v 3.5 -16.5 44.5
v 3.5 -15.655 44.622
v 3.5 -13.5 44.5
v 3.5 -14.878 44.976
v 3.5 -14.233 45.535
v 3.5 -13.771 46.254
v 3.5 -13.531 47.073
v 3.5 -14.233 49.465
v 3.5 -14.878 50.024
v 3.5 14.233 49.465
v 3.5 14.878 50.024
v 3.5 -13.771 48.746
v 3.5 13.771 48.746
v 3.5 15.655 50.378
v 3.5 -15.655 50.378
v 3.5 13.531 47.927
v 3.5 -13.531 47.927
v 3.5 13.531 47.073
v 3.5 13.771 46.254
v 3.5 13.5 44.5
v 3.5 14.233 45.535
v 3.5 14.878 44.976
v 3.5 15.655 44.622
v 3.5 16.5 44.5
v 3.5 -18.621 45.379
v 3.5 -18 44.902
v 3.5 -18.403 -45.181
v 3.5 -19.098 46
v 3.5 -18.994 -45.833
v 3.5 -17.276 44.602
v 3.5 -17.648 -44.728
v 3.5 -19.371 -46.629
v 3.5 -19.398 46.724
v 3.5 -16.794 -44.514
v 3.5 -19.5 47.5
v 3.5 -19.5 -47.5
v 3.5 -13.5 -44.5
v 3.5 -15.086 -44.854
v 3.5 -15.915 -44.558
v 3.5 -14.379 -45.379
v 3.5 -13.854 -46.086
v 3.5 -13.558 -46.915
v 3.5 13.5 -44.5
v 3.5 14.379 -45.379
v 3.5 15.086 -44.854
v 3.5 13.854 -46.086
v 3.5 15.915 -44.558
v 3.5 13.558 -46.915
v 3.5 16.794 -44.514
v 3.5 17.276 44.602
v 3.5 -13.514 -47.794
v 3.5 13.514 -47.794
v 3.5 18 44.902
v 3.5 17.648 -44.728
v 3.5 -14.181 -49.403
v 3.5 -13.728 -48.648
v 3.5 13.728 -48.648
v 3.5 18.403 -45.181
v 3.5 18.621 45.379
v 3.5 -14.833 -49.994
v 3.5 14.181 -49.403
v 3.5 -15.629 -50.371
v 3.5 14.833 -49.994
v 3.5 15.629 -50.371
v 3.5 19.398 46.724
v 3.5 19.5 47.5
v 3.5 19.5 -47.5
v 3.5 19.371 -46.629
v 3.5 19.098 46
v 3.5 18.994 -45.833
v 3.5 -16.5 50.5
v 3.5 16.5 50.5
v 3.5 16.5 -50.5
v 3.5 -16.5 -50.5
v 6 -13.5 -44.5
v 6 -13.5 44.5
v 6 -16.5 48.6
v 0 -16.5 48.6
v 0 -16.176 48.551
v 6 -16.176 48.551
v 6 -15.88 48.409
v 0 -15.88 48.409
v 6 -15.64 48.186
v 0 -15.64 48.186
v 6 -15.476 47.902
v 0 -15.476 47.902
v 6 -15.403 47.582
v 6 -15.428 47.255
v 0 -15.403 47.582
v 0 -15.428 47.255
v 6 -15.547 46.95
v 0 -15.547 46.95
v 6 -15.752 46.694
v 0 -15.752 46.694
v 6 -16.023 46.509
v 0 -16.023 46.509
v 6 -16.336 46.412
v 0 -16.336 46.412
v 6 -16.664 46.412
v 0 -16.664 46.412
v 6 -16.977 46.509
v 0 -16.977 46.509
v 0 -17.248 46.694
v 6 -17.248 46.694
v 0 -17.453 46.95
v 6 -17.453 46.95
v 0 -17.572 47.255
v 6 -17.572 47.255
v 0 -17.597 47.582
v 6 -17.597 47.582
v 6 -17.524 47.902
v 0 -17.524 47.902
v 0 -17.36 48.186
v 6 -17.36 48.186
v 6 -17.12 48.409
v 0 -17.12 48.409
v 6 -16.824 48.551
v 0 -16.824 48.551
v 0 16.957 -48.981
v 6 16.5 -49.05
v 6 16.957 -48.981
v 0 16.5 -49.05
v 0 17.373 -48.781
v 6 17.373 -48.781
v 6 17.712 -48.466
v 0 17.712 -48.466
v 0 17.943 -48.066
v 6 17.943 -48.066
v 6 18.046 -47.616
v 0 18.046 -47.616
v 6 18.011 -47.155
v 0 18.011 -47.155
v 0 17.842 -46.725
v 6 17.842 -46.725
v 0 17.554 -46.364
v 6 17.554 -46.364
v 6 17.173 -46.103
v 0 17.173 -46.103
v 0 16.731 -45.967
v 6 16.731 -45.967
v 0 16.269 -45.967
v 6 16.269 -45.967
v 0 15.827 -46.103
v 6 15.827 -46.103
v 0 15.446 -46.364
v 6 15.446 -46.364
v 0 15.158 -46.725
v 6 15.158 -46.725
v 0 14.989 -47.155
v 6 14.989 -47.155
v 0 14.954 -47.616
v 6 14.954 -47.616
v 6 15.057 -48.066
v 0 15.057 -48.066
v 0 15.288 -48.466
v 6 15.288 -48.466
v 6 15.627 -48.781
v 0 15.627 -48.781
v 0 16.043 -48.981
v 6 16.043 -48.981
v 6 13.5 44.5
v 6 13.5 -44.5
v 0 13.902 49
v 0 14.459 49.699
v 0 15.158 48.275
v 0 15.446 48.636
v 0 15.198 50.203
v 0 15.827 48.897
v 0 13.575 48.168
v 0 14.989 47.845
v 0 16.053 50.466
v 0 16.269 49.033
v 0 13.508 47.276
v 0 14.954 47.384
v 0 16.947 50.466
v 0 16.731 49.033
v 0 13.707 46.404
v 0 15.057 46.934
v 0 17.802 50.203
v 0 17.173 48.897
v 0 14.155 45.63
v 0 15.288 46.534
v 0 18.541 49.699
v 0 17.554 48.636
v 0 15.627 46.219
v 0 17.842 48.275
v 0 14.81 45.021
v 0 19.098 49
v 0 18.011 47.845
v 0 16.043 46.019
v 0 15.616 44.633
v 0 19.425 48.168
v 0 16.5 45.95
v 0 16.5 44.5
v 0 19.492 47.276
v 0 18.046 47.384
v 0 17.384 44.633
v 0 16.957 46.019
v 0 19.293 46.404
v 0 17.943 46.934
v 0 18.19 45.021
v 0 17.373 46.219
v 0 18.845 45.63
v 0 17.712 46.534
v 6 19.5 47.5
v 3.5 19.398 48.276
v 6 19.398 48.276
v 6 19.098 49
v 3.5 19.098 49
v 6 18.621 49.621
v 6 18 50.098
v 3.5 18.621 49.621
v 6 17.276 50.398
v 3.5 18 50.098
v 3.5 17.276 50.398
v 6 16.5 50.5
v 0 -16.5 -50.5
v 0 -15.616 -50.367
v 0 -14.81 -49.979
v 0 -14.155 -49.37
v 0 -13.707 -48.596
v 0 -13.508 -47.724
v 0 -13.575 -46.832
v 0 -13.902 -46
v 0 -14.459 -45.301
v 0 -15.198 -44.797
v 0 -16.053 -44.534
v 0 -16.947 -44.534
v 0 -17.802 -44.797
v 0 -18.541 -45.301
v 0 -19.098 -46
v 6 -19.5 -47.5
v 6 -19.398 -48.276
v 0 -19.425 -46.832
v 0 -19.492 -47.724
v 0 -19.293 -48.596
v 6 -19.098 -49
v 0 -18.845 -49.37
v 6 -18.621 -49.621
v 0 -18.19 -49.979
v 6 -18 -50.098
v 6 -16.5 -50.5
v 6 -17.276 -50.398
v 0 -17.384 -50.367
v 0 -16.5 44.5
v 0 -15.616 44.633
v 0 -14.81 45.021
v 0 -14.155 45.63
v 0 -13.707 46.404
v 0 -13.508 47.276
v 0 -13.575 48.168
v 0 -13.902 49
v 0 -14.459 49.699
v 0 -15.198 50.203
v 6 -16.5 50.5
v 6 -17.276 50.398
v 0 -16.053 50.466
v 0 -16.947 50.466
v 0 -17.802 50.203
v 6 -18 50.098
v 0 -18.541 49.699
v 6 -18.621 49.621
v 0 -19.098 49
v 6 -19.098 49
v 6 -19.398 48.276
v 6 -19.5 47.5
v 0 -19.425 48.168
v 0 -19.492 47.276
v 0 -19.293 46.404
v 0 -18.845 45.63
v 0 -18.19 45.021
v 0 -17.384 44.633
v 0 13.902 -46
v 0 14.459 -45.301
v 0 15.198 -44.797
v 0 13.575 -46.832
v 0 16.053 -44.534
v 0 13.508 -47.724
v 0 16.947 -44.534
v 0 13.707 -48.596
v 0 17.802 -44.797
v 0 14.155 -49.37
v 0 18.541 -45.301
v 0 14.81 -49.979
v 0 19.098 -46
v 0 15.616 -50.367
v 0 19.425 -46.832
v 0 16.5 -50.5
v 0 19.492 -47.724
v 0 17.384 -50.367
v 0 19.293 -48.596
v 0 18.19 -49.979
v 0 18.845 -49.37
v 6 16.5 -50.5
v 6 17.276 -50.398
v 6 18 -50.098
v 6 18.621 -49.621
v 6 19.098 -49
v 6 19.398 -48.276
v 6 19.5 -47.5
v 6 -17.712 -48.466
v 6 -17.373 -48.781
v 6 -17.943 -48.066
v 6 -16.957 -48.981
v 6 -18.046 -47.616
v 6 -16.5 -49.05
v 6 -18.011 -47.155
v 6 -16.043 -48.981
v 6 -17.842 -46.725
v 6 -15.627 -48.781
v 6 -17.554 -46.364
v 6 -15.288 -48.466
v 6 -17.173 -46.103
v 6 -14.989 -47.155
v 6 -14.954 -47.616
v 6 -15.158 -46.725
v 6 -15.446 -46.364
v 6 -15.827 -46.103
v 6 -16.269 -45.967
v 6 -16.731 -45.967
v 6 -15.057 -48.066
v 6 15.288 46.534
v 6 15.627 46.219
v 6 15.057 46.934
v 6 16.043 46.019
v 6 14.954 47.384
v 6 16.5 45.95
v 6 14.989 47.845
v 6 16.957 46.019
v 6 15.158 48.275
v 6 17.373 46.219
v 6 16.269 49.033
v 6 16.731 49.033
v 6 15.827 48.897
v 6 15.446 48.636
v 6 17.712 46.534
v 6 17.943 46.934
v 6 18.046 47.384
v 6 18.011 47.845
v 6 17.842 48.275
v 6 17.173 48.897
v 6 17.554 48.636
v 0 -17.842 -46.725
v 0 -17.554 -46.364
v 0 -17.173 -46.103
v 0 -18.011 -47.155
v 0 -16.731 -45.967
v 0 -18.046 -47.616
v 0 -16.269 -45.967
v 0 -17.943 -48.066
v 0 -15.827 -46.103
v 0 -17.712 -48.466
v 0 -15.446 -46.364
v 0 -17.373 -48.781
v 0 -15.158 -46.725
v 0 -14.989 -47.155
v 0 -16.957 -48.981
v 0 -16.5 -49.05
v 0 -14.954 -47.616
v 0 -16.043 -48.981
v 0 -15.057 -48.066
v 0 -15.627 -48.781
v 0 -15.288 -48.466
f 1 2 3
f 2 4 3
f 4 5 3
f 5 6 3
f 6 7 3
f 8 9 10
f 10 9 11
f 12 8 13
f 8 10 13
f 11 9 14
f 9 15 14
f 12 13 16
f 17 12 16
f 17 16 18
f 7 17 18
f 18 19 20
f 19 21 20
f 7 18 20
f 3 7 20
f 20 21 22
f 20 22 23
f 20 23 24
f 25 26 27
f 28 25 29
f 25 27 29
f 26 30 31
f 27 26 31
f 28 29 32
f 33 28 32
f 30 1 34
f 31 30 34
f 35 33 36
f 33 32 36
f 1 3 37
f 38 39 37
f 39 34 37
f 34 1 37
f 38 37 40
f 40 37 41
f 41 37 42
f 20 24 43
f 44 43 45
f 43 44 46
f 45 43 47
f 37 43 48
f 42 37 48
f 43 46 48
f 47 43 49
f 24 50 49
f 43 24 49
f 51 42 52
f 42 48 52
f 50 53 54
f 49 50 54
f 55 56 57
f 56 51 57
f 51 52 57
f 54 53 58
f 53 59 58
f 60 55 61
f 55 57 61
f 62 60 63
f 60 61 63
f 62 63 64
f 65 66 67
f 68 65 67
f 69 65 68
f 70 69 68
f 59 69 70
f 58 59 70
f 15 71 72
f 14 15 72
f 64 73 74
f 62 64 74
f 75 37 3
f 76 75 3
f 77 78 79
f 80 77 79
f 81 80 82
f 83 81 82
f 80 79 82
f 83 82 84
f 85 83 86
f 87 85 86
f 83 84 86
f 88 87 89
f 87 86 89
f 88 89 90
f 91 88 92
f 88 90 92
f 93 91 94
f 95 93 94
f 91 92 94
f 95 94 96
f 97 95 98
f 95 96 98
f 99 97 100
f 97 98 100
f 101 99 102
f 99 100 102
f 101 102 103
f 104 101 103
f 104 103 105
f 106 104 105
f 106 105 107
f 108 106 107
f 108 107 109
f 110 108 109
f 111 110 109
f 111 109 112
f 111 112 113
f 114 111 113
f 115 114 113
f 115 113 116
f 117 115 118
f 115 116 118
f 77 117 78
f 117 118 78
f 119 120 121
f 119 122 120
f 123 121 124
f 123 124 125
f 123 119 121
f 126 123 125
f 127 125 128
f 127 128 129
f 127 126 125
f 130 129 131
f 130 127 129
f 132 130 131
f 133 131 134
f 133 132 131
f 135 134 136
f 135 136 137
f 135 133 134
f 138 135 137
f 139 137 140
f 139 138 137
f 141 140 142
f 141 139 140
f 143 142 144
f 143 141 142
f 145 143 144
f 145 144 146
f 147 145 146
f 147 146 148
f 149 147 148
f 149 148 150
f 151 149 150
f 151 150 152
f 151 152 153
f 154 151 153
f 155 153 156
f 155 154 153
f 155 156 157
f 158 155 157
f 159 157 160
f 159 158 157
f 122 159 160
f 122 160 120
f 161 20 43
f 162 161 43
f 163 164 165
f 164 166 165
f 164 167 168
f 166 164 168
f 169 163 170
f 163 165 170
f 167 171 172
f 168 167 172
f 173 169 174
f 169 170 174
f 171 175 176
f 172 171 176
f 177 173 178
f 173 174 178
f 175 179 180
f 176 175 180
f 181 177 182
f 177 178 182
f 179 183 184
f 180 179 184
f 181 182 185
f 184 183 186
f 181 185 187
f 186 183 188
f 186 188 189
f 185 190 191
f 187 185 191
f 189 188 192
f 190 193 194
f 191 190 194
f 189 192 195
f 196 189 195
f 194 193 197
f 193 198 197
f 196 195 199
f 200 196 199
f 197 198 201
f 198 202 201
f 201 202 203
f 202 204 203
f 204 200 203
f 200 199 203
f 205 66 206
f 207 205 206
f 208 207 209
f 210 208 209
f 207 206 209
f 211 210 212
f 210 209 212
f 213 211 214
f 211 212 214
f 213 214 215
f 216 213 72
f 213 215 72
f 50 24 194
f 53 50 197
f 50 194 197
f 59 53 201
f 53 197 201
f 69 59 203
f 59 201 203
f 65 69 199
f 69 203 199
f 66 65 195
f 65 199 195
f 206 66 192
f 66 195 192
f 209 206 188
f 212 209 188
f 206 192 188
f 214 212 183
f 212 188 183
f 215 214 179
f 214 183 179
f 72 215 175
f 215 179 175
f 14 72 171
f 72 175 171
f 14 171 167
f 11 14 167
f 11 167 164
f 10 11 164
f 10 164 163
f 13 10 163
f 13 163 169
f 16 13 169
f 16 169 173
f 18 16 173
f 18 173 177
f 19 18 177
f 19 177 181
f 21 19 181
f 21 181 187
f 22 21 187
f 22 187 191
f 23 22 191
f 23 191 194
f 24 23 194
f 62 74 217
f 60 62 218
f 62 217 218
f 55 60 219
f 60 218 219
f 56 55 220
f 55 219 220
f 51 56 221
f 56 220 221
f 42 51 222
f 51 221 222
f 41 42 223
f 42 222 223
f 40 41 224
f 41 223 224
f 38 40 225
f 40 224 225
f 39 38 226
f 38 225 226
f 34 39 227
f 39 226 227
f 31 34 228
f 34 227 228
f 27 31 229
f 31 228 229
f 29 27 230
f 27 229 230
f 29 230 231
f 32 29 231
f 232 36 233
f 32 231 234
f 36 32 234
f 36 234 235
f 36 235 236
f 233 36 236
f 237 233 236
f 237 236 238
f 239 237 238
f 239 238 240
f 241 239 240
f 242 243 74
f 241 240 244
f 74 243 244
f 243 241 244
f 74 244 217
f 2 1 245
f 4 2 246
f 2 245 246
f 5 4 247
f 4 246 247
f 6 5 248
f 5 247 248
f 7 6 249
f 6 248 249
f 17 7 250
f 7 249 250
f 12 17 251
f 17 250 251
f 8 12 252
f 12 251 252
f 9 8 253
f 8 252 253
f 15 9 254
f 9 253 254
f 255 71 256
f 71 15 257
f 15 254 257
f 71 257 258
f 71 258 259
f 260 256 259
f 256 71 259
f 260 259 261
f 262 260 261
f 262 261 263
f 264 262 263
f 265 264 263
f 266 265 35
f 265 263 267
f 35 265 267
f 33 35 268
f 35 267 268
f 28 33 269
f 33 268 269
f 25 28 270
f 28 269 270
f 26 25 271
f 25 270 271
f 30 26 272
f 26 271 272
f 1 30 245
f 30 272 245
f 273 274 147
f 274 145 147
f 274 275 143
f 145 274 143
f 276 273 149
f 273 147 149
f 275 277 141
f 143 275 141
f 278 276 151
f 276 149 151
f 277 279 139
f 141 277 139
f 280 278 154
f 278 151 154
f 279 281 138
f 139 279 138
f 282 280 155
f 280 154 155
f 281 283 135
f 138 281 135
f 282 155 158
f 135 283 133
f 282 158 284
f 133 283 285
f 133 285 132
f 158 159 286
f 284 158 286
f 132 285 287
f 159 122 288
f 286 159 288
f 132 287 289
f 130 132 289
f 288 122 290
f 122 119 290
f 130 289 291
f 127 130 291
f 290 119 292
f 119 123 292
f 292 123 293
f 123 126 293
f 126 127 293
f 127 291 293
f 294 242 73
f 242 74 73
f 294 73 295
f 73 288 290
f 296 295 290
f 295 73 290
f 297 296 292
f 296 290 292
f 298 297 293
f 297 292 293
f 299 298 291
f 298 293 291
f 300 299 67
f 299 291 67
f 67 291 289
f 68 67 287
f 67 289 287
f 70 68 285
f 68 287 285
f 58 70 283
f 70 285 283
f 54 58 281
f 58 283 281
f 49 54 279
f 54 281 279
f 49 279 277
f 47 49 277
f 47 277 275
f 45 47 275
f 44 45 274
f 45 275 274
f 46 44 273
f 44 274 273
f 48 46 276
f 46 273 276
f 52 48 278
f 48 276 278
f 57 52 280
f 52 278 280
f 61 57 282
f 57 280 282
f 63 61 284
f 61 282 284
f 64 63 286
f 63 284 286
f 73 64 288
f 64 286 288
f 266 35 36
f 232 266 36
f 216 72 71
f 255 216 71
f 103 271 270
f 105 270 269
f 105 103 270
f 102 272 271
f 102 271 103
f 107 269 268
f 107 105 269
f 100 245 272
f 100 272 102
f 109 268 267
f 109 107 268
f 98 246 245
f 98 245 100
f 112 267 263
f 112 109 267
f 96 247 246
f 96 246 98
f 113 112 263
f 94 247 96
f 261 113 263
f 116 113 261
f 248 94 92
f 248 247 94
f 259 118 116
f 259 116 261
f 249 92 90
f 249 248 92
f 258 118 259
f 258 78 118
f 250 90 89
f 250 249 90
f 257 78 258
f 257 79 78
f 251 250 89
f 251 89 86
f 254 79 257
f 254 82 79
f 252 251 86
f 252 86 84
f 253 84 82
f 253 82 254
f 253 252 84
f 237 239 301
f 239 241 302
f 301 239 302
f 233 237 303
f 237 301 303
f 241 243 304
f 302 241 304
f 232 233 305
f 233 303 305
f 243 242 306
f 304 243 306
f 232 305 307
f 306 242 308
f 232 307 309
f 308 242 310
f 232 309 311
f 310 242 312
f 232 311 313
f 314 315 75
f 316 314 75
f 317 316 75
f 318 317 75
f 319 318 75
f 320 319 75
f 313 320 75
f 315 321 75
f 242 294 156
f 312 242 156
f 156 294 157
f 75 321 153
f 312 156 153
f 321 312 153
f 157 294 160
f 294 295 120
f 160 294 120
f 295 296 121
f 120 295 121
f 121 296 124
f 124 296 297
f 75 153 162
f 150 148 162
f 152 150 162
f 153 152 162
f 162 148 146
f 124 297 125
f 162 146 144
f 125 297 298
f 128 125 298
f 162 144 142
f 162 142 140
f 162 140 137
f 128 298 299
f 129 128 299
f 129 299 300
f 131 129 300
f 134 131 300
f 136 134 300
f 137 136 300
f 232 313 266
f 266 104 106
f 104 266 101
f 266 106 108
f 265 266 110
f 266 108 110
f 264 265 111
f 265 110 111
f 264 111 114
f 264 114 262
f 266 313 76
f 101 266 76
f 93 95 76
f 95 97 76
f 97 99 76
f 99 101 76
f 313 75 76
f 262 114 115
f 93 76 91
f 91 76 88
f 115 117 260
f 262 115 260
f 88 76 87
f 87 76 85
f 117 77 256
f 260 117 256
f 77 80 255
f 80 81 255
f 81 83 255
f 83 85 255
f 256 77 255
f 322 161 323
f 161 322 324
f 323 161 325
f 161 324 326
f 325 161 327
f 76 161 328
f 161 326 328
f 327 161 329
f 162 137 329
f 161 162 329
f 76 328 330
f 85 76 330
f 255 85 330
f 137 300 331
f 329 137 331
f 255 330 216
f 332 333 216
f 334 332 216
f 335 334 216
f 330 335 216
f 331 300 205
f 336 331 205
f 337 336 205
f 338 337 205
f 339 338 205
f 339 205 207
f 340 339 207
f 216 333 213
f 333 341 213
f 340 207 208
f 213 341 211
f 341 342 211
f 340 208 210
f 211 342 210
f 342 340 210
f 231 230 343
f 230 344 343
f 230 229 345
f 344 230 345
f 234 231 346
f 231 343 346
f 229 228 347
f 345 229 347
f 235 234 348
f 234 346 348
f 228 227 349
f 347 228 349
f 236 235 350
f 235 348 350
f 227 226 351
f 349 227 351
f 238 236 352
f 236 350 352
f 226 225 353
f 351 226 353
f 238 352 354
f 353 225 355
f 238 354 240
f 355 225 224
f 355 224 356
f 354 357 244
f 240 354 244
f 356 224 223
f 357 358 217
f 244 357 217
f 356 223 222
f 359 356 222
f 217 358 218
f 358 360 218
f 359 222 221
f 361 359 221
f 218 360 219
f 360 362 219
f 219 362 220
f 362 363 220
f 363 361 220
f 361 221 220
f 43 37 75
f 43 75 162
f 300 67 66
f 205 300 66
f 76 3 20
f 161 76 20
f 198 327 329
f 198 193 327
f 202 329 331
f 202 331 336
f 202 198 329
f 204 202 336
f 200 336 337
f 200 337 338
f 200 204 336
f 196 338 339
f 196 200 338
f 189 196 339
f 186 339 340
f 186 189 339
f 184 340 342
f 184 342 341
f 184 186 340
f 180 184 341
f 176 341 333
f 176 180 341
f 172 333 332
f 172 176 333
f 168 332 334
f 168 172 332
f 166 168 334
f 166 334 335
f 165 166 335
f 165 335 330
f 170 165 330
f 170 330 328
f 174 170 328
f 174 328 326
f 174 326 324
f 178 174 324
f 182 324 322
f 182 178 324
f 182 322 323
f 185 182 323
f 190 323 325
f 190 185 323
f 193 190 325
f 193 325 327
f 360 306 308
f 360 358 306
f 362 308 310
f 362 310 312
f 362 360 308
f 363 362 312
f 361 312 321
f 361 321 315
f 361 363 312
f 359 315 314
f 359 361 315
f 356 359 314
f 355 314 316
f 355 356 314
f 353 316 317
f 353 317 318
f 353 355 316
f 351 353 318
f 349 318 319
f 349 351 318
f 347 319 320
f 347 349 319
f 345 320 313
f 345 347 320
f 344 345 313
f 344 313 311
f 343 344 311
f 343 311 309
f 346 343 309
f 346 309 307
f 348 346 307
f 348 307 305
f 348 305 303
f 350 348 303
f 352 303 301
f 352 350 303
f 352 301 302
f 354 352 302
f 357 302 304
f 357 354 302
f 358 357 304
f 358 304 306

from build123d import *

# Parameters (mm, degrees)
SKETCH1_R             = 3
SKETCH1_R_2           = 1.55
BOSS_EXTRUDE1_DEPTH   = 3.5
BOSS_EXTRUDE1_2_DEPTH = 3.5
BOSS_EXTRUDE1_3_DEPTH = 3.5
BOSS_EXTRUDE1_4_DEPTH = 3.5
SKETCH2_R             = 3
SKETCH2_R_2           = 1.55
BOSS_EXTRUDE2_DEPTH   = 2.5
SKETCH3_W             = 6
SKETCH3_H             = 6
BOSS_EXTRUDE3_DEPTH   = 5
SKETCH4_W             = 6
SKETCH4_H             = 15
BOSS_EXTRUDE4_DEPTH   = 2.5
SKETCH5_W             = 4
SKETCH5_H             = 6
BOSS_EXTRUDE5_DEPTH   = 21.9
SKETCH6_W             = 6.7
SKETCH6_H             = 15
BOSS_EXTRUDE6_DEPTH   = 2.5
SKETCH7_R             = 1.55
SKETCH7_R_2           = 1.1
BOSS_EXTRUDE7_DEPTH   = 6


with BuildPart() as part:
    # Sketch1 → Boss-Extrude1 (new body)
    with BuildSketch(Plane(origin=(0, 0, 0), x_dir=(0, 0, -1), z_dir=(1, 0, 0))):
        with Locations((-47.5, 16.5)):
            Circle(SKETCH1_R)
        with Locations((-47.5, 16.5)):
            Circle(SKETCH1_R_2, mode=Mode.SUBTRACT)
    extrude(amount=BOSS_EXTRUDE1_DEPTH)



with BuildPart() as body_2:
    # Sketch1 → Boss-Extrude1 2 (new body)
    with BuildSketch(Plane(origin=(0, 0, 0), x_dir=(0, 0, -1), z_dir=(1, 0, 0))):
        with Locations((-47.5, -16.5)):
            Circle(SKETCH1_R)
        with Locations((-47.5, -16.5)):
            Circle(SKETCH1_R_2, mode=Mode.SUBTRACT)
    extrude(amount=BOSS_EXTRUDE1_2_DEPTH)


with BuildPart() as body_3:
    # Sketch1 → Boss-Extrude1 3 (new body)
    with BuildSketch(Plane(origin=(0, 0, 0), x_dir=(0, 0, -1), z_dir=(1, 0, 0))):
        with Locations((47.5, -16.5)):
            Circle(SKETCH1_R)
        with Locations((47.5, -16.5)):
            Circle(SKETCH1_R_2, mode=Mode.SUBTRACT)
    extrude(amount=BOSS_EXTRUDE1_3_DEPTH)


with BuildPart() as body_4:
    # Sketch1 → Boss-Extrude1 4 (new body)
    with BuildSketch(Plane(origin=(0, 0, 0), x_dir=(0, 0, -1), z_dir=(1, 0, 0))):
        with Locations((47.5, 16.5)):
            Circle(SKETCH1_R)
        with Locations((47.5, 16.5)):
            Circle(SKETCH1_R_2, mode=Mode.SUBTRACT)
    extrude(amount=BOSS_EXTRUDE1_4_DEPTH)


with BuildPart() as part_1:
    add(part.part)

    add(body_2.part)  # Boss-Extrude2 merges body 2

    add(body_3.part)  # Boss-Extrude2 merges body 3

    add(body_4.part)  # Boss-Extrude2 merges body 4
    # Sketch2 → Boss-Extrude2 (add)
    # profile 1 of 12: a face of its own
    with BuildSketch(Plane(origin=(3.5, 0, 0), x_dir=(0, 0, -1), z_dir=(1, 0, 0))):
        with BuildLine():
            Line((47.5, 19.5), (-47.5, 19.5))
            ThreePointArc((-47.5, 19.5), (-45.378679656, 18.621320344), (-44.5, 16.5))
            Line((-44.5, 16.5), (-44.5, 13.5))
            Line((-44.5, 13.5), (44.5, 13.5))
            Line((44.5, 13.5), (44.5, 16.5))
            ThreePointArc((44.5, 16.5), (45.378679656, 18.621320344), (47.5, 19.5))
        make_face()
    # profile 2 of 12: a face of its own
    with BuildSketch(Plane(origin=(3.5, 0, 0), x_dir=(0, 0, -1), z_dir=(1, 0, 0))):
        with Locations(Location((-47.5, 16.5, 0), (0, 0, 180))):
            Circle(SKETCH2_R)
        with Locations((-47.5, 16.5)):
            Circle(SKETCH2_R_2, mode=Mode.SUBTRACT)
    # profile 3 of 12: a face of its own
    with BuildSketch(Plane(origin=(3.5, 0, 0), x_dir=(0, 0, -1), z_dir=(1, 0, 0))):
        with BuildLine():
            Line((-44.5, 13.5), (-44.5, 16.5))
            ThreePointArc((-44.5, 16.5), (-45.378679656, 14.378679656), (-47.5, 13.5))
            Line((-47.5, 13.5), (-44.5, 13.5))
        make_face()
    # profile 4 of 12: a face of its own
    with BuildSketch(Plane(origin=(3.5, 0, 0), x_dir=(0, 0, -1), z_dir=(1, 0, 0))):
        with BuildLine():
            ThreePointArc((-47.5, 13.5), (-49.621320344, 14.378679656), (-50.5, 16.5))
            Line((-50.5, 16.5), (-50.5, -16.5))
            ThreePointArc((-50.5, -16.5), (-49.621320344, -14.378679656), (-47.5, -13.5))
            Line((-47.5, -13.5), (-44.5, -13.5))
            Line((-44.5, -13.5), (-44.5, 13.5))
            Line((-44.5, 13.5), (-47.5, 13.5))
        make_face()
    # profile 5 of 12: a face of its own
    with BuildSketch(Plane(origin=(3.5, 0, 0), x_dir=(0, 0, -1), z_dir=(1, 0, 0))):
        with BuildLine():
            Line((-44.5, -16.5), (-44.5, -13.5))
            Line((-44.5, -13.5), (-47.5, -13.5))
            ThreePointArc((-47.5, -13.5), (-45.378679656, -14.378679656), (-44.5, -16.5))
        make_face()
    # profile 6 of 12: a face of its own
    with BuildSketch(Plane(origin=(3.5, 0, 0), x_dir=(0, 0, -1), z_dir=(1, 0, 0))):
        with BuildLine():
            Line((44.5, -13.5), (-44.5, -13.5))
            Line((-44.5, -13.5), (-44.5, -16.5))
            ThreePointArc((-44.5, -16.5), (-45.378679656, -18.621320344), (-47.5, -19.5))
            Line((-47.5, -19.5), (47.5, -19.5))
            ThreePointArc((47.5, -19.5), (45.378679656, -18.621320344), (44.5, -16.5))
            Line((44.5, -16.5), (44.5, -13.5))
        make_face()
    # profile 7 of 12: a face of its own
    with BuildSketch(Plane(origin=(3.5, 0, 0), x_dir=(0, 0, -1), z_dir=(1, 0, 0))):
        with Locations(Location((-47.5, -16.5, 0), (0, 0, 180))):
            Circle(SKETCH2_R)
        with Locations((-47.5, -16.5)):
            Circle(SKETCH2_R_2, mode=Mode.SUBTRACT)
    # profile 8 of 12: a face of its own
    with BuildSketch(Plane(origin=(3.5, 0, 0), x_dir=(0, 0, -1), z_dir=(1, 0, 0))):
        with BuildLine():
            Line((50.5, -16.5), (50.5, 16.5))
            ThreePointArc((50.5, 16.5), (49.621320344, 14.378679656), (47.5, 13.5))
            Line((47.5, 13.5), (44.5, 13.5))
            Line((44.5, 13.5), (44.5, -13.5))
            Line((44.5, -13.5), (47.5, -13.5))
            ThreePointArc((47.5, -13.5), (49.621320344, -14.378679656), (50.5, -16.5))
        make_face()
    # profile 9 of 12: a face of its own
    with BuildSketch(Plane(origin=(3.5, 0, 0), x_dir=(0, 0, -1), z_dir=(1, 0, 0))):
        with BuildLine():
            ThreePointArc((44.5, -16.5), (45.378679656, -14.378679656), (47.5, -13.5))
            Line((47.5, -13.5), (44.5, -13.5))
            Line((44.5, -13.5), (44.5, -16.5))
        make_face()
    # profile 10 of 12: a face of its own
    with BuildSketch(Plane(origin=(3.5, 0, 0), x_dir=(0, 0, -1), z_dir=(1, 0, 0))):
        with Locations((47.5, -16.5)):
            Circle(SKETCH2_R)
        with Locations((47.5, -16.5)):
            Circle(SKETCH2_R_2, mode=Mode.SUBTRACT)
    # profile 11 of 12: a face of its own
    with BuildSketch(Plane(origin=(3.5, 0, 0), x_dir=(0, 0, -1), z_dir=(1, 0, 0))):
        with BuildLine():
            ThreePointArc((47.5, 13.5), (45.378679656, 14.378679656), (44.5, 16.5))
            Line((44.5, 16.5), (44.5, 13.5))
            Line((44.5, 13.5), (47.5, 13.5))
        make_face()
    # profile 12 of 12: a face of its own
    with BuildSketch(Plane(origin=(3.5, 0, 0), x_dir=(0, 0, -1), z_dir=(1, 0, 0))):
        with Locations((47.5, 16.5)):
            Circle(SKETCH2_R)
        with Locations((47.5, 16.5)):
            Circle(SKETCH2_R_2, mode=Mode.SUBTRACT)
    extrude(amount=BOSS_EXTRUDE2_DEPTH)

    # Sketch3 → Boss-Extrude3 (add)
    with BuildSketch(Plane(origin=(6, 0, 0), x_dir=(0, 0, -1), z_dir=(1, 0, 0))):
        with Locations((47.5, -10.5)):
            Rectangle(SKETCH3_W, SKETCH3_H)
        with Locations((-47.5, -10.5)):
            Rectangle(SKETCH3_W, SKETCH3_H)
    extrude(amount=BOSS_EXTRUDE3_DEPTH)

    # Sketch4 → Boss-Extrude4 (add)
    with BuildSketch(Plane(origin=(11, 0, 0), x_dir=(0, 0, -1), z_dir=(1, 0, 0))):
        with Locations((47.5, -15)):
            Rectangle(SKETCH4_W, SKETCH4_H)
    extrude(amount=BOSS_EXTRUDE4_DEPTH)

    # Sketch5 → Boss-Extrude5 (add)
    with BuildSketch(Plane.XY.offset(50.5)):
        with Locations((9, -10.5)):
            Rectangle(SKETCH5_W, SKETCH5_H)
    extrude(amount=BOSS_EXTRUDE5_DEPTH)

    # Sketch6 → Boss-Extrude6 (add)
    with BuildSketch(Plane(origin=(11, 0, 0), x_dir=(0, 0, -1), z_dir=(1, 0, 0))):
        with Locations((-69.05, -15)):
            Rectangle(SKETCH6_W, SKETCH6_H)
    extrude(amount=BOSS_EXTRUDE6_DEPTH)


with BuildPart() as body_2_2:
    # Split1: the piece on the far side of the plane
    add(part_1.part)
    split(bisect_by=Plane(origin=(6, 0, 0), x_dir=(0, 0, 1), z_dir=(1, 0, 0)), keep=Keep.BOTTOM)

    # Sketch7 → Boss-Extrude7 (add)
    with BuildSketch(Plane.ZY):
        with Locations((47.5, -16.5)):
            Circle(SKETCH7_R)
        with Locations((47.5, -16.5)):
            Circle(SKETCH7_R_2, mode=Mode.SUBTRACT)
    extrude(amount=-BOSS_EXTRUDE7_DEPTH)


with BuildPart() as part_2:
    add(part_1.part)

    # Split1
    split(bisect_by=Plane(origin=(6, 0, 0), x_dir=(0, 0, 1), z_dir=(1, 0, 0)), keep=Keep.TOP)


solid = body_2_2.part
